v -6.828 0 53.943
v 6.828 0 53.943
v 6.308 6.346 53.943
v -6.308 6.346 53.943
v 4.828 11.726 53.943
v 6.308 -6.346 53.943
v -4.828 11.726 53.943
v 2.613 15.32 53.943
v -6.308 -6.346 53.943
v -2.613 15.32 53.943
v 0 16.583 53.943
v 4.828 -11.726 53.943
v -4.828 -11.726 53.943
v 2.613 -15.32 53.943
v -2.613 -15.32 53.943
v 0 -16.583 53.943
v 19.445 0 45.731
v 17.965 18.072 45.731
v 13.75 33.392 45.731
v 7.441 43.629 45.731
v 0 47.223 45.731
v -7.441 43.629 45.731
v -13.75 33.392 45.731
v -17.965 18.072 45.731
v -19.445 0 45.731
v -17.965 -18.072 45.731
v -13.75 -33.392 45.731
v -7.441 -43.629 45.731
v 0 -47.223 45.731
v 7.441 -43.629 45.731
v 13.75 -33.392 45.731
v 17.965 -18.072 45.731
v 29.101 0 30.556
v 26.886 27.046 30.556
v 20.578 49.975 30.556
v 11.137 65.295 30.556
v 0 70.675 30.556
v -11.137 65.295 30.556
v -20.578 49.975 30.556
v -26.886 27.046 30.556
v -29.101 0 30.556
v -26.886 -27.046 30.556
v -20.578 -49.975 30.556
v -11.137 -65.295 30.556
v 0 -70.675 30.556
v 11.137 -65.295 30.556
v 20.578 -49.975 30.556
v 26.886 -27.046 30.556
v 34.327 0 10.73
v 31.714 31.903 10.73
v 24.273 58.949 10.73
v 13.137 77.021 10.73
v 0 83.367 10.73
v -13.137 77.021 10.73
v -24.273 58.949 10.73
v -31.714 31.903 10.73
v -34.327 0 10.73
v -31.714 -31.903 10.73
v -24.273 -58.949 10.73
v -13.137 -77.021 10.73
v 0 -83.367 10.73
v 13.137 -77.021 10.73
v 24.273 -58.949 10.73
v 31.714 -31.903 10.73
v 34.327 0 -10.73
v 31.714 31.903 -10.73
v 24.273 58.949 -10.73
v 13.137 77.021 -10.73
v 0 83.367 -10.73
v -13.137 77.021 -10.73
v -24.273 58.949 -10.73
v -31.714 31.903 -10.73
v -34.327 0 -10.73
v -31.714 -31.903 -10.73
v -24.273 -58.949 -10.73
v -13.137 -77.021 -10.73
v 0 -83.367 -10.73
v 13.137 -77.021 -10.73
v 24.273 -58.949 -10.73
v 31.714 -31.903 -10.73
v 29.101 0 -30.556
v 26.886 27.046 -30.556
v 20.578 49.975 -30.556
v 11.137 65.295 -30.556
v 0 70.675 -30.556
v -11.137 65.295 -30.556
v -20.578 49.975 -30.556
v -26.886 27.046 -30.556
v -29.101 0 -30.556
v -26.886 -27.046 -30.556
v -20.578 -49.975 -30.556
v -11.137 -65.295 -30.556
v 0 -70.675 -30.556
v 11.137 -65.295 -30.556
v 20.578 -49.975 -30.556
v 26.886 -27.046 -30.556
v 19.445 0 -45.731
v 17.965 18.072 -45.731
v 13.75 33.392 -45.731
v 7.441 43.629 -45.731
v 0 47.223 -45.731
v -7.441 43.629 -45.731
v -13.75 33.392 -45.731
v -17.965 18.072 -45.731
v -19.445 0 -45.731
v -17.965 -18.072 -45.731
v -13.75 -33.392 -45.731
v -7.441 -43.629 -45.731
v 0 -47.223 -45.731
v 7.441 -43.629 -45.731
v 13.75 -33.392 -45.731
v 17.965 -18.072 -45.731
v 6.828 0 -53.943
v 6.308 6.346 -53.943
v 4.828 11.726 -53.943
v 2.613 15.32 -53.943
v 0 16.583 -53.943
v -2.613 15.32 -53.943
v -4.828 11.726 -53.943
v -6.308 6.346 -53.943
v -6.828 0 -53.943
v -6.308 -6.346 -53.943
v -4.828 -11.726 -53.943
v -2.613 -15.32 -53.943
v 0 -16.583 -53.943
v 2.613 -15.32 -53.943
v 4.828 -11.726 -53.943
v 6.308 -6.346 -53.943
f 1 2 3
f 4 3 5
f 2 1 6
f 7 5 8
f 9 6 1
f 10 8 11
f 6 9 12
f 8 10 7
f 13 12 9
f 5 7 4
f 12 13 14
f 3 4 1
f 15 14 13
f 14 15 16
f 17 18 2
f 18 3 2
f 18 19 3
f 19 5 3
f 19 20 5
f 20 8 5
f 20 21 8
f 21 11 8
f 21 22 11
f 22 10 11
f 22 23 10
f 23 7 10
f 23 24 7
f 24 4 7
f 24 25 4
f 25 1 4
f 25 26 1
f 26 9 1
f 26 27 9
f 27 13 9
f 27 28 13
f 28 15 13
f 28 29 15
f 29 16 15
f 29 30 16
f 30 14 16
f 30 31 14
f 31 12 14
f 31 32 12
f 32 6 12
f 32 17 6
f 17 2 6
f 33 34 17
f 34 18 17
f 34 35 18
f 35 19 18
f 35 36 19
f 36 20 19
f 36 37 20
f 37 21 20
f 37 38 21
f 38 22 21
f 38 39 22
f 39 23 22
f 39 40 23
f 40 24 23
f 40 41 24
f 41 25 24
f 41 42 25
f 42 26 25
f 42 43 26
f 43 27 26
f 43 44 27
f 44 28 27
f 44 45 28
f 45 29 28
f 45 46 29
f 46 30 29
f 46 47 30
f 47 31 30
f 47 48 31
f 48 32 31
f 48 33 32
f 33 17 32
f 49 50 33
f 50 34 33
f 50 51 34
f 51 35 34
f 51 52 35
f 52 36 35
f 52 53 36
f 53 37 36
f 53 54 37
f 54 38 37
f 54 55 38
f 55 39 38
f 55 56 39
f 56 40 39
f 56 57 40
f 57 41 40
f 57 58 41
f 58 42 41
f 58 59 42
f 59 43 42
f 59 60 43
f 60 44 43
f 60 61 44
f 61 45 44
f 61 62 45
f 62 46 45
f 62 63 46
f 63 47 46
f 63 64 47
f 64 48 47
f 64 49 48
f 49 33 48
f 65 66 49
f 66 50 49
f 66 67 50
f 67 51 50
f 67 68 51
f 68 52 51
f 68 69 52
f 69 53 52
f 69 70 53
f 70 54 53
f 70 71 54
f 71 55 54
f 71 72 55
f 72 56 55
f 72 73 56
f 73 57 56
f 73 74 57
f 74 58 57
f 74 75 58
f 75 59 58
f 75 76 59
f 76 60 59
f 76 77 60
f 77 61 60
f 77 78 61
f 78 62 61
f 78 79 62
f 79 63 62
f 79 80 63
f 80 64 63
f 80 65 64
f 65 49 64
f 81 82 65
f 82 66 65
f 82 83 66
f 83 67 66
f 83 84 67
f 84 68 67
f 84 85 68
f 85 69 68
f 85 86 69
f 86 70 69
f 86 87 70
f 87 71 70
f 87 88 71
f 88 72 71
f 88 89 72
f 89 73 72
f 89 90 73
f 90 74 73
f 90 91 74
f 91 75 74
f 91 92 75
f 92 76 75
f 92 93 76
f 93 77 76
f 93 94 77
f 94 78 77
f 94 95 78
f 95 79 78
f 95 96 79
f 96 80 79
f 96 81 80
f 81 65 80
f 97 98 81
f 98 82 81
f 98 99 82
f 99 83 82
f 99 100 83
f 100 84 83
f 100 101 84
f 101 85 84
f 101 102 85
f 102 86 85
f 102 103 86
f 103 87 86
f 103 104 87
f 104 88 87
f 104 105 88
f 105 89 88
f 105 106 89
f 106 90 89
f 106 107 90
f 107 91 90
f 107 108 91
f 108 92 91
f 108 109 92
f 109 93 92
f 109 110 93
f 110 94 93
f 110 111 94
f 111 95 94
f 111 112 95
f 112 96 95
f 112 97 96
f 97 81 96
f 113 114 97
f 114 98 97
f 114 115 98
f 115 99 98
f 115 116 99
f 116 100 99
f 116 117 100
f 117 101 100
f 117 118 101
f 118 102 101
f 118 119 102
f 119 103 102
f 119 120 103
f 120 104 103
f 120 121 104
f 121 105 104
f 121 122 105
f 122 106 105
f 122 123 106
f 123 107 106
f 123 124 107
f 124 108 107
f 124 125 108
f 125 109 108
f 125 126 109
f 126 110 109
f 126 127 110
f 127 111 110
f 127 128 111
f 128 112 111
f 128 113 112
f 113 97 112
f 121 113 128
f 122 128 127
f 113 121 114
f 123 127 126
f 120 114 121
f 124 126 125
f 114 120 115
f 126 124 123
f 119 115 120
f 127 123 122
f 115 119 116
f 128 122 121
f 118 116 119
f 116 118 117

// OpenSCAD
// Generated by SolidPython 1.0.1 on 2020-07-29 00:46:48


scale(v = [7, 17, 11]) {
	sphere(r = 5);
}
/***********************************************
*********      SolidPython code:      **********
************************************************
 
# import packages: SolidPython
from solid import *
from solid.utils import *
from itertools import chain, combinations, permutations


class Resize:

    def __init__(self, scad_file):
        self.scad_file = scad_file
        #self.scad_file = import_scad(scad_file)
        # cone/cylinder param:
        self.r1 = 0
        self.r2 = 0
        self.h = 0
        # rectangular prism param:
        self.w = 0
        self.l = 0
        # ellipse param:
        self.r = 0

    # import OpenScad code (file name corresponds to shape)


    # classify shape + parameters
    def assign(self, param1, param2, param3):
        if self.scad_file == 'cone.scad':
            self.r1 = param1
            self.r2 = param2
            self.h = param3
        elif self.scad_file == 'cylinder.scad':
            self.r1 = param1
            self.r2 = param2
            self.h = param3
        elif self.scad_file == 'rectangularPrism.scad':
            self.h = param1
            self.l = param2
            self.w = param3
        else:
            self.r = param1
            self.h = param2

    # resize parameters
    def iterate(self):
        x = range(3, 20, 2)
        i = 1
        if self.scad_file == 'cone.scad':
            tempList = list(permutations(x, 2))
            for temp in tempList:
                param1 = temp[0]
                param2 = temp[1]
                filepath = 'produced_scad_files/' + 'cone' + str(param1) + '_' + str(param2) + '_' + '.scad'
                scad_render_to_file(cylinder(h=param1, r1=param2, r2=0), filepath)

        elif self.scad_file == 'cylinder.scad':
            tempList = list(permutations(x, 3))
            for temp in tempList:
                param1 = temp[0]
                param2 = temp[1]
                filepath = 'produced_scad_files/' + 'cylinder' + str(param1) + '_' + str(param2) + '_' + '.scad'
                scad_render_to_file(cylinder(h=param1, r1=param2, r2=param2), filepath)

        elif self.scad_file == 'rectangularPrism.scad':
            tempList = list(permutations(x, 3))
            for temp in tempList:
                param1 = temp[0]
                param2 = temp[1]
                param3 = temp[2]
                filepath = 'produced_scad_files/' + 'rectangularPrism' + str(param1) + '_' + str(param2) + '_' + str(
                    param3) + '.scad'
                scad_render_to_file(cube(size=(param1, param2, param3)), filepath)

        elif self.scad_file == 'ellipse.scad':
            tempList = list(permutations(x, 4))
            for temp in tempList:
                param1 = temp[0]
                param2 = temp[1]
                param3 = temp[2]
                param4 = temp[3]
                filepath = 'produced_scad_files/' + 'ellipse' + str(param1) + '_' + str(param2) + '_' + str(param3) + '_' + str(param4) + '.scad'
                scad_render_to_file(scale([param1, param2, param3])(sphere(r=param4)), filepath)

    def render_to_scadfile(self):
        scad_render_to_file(scad, 'example.scad') 
 
************************************************/
